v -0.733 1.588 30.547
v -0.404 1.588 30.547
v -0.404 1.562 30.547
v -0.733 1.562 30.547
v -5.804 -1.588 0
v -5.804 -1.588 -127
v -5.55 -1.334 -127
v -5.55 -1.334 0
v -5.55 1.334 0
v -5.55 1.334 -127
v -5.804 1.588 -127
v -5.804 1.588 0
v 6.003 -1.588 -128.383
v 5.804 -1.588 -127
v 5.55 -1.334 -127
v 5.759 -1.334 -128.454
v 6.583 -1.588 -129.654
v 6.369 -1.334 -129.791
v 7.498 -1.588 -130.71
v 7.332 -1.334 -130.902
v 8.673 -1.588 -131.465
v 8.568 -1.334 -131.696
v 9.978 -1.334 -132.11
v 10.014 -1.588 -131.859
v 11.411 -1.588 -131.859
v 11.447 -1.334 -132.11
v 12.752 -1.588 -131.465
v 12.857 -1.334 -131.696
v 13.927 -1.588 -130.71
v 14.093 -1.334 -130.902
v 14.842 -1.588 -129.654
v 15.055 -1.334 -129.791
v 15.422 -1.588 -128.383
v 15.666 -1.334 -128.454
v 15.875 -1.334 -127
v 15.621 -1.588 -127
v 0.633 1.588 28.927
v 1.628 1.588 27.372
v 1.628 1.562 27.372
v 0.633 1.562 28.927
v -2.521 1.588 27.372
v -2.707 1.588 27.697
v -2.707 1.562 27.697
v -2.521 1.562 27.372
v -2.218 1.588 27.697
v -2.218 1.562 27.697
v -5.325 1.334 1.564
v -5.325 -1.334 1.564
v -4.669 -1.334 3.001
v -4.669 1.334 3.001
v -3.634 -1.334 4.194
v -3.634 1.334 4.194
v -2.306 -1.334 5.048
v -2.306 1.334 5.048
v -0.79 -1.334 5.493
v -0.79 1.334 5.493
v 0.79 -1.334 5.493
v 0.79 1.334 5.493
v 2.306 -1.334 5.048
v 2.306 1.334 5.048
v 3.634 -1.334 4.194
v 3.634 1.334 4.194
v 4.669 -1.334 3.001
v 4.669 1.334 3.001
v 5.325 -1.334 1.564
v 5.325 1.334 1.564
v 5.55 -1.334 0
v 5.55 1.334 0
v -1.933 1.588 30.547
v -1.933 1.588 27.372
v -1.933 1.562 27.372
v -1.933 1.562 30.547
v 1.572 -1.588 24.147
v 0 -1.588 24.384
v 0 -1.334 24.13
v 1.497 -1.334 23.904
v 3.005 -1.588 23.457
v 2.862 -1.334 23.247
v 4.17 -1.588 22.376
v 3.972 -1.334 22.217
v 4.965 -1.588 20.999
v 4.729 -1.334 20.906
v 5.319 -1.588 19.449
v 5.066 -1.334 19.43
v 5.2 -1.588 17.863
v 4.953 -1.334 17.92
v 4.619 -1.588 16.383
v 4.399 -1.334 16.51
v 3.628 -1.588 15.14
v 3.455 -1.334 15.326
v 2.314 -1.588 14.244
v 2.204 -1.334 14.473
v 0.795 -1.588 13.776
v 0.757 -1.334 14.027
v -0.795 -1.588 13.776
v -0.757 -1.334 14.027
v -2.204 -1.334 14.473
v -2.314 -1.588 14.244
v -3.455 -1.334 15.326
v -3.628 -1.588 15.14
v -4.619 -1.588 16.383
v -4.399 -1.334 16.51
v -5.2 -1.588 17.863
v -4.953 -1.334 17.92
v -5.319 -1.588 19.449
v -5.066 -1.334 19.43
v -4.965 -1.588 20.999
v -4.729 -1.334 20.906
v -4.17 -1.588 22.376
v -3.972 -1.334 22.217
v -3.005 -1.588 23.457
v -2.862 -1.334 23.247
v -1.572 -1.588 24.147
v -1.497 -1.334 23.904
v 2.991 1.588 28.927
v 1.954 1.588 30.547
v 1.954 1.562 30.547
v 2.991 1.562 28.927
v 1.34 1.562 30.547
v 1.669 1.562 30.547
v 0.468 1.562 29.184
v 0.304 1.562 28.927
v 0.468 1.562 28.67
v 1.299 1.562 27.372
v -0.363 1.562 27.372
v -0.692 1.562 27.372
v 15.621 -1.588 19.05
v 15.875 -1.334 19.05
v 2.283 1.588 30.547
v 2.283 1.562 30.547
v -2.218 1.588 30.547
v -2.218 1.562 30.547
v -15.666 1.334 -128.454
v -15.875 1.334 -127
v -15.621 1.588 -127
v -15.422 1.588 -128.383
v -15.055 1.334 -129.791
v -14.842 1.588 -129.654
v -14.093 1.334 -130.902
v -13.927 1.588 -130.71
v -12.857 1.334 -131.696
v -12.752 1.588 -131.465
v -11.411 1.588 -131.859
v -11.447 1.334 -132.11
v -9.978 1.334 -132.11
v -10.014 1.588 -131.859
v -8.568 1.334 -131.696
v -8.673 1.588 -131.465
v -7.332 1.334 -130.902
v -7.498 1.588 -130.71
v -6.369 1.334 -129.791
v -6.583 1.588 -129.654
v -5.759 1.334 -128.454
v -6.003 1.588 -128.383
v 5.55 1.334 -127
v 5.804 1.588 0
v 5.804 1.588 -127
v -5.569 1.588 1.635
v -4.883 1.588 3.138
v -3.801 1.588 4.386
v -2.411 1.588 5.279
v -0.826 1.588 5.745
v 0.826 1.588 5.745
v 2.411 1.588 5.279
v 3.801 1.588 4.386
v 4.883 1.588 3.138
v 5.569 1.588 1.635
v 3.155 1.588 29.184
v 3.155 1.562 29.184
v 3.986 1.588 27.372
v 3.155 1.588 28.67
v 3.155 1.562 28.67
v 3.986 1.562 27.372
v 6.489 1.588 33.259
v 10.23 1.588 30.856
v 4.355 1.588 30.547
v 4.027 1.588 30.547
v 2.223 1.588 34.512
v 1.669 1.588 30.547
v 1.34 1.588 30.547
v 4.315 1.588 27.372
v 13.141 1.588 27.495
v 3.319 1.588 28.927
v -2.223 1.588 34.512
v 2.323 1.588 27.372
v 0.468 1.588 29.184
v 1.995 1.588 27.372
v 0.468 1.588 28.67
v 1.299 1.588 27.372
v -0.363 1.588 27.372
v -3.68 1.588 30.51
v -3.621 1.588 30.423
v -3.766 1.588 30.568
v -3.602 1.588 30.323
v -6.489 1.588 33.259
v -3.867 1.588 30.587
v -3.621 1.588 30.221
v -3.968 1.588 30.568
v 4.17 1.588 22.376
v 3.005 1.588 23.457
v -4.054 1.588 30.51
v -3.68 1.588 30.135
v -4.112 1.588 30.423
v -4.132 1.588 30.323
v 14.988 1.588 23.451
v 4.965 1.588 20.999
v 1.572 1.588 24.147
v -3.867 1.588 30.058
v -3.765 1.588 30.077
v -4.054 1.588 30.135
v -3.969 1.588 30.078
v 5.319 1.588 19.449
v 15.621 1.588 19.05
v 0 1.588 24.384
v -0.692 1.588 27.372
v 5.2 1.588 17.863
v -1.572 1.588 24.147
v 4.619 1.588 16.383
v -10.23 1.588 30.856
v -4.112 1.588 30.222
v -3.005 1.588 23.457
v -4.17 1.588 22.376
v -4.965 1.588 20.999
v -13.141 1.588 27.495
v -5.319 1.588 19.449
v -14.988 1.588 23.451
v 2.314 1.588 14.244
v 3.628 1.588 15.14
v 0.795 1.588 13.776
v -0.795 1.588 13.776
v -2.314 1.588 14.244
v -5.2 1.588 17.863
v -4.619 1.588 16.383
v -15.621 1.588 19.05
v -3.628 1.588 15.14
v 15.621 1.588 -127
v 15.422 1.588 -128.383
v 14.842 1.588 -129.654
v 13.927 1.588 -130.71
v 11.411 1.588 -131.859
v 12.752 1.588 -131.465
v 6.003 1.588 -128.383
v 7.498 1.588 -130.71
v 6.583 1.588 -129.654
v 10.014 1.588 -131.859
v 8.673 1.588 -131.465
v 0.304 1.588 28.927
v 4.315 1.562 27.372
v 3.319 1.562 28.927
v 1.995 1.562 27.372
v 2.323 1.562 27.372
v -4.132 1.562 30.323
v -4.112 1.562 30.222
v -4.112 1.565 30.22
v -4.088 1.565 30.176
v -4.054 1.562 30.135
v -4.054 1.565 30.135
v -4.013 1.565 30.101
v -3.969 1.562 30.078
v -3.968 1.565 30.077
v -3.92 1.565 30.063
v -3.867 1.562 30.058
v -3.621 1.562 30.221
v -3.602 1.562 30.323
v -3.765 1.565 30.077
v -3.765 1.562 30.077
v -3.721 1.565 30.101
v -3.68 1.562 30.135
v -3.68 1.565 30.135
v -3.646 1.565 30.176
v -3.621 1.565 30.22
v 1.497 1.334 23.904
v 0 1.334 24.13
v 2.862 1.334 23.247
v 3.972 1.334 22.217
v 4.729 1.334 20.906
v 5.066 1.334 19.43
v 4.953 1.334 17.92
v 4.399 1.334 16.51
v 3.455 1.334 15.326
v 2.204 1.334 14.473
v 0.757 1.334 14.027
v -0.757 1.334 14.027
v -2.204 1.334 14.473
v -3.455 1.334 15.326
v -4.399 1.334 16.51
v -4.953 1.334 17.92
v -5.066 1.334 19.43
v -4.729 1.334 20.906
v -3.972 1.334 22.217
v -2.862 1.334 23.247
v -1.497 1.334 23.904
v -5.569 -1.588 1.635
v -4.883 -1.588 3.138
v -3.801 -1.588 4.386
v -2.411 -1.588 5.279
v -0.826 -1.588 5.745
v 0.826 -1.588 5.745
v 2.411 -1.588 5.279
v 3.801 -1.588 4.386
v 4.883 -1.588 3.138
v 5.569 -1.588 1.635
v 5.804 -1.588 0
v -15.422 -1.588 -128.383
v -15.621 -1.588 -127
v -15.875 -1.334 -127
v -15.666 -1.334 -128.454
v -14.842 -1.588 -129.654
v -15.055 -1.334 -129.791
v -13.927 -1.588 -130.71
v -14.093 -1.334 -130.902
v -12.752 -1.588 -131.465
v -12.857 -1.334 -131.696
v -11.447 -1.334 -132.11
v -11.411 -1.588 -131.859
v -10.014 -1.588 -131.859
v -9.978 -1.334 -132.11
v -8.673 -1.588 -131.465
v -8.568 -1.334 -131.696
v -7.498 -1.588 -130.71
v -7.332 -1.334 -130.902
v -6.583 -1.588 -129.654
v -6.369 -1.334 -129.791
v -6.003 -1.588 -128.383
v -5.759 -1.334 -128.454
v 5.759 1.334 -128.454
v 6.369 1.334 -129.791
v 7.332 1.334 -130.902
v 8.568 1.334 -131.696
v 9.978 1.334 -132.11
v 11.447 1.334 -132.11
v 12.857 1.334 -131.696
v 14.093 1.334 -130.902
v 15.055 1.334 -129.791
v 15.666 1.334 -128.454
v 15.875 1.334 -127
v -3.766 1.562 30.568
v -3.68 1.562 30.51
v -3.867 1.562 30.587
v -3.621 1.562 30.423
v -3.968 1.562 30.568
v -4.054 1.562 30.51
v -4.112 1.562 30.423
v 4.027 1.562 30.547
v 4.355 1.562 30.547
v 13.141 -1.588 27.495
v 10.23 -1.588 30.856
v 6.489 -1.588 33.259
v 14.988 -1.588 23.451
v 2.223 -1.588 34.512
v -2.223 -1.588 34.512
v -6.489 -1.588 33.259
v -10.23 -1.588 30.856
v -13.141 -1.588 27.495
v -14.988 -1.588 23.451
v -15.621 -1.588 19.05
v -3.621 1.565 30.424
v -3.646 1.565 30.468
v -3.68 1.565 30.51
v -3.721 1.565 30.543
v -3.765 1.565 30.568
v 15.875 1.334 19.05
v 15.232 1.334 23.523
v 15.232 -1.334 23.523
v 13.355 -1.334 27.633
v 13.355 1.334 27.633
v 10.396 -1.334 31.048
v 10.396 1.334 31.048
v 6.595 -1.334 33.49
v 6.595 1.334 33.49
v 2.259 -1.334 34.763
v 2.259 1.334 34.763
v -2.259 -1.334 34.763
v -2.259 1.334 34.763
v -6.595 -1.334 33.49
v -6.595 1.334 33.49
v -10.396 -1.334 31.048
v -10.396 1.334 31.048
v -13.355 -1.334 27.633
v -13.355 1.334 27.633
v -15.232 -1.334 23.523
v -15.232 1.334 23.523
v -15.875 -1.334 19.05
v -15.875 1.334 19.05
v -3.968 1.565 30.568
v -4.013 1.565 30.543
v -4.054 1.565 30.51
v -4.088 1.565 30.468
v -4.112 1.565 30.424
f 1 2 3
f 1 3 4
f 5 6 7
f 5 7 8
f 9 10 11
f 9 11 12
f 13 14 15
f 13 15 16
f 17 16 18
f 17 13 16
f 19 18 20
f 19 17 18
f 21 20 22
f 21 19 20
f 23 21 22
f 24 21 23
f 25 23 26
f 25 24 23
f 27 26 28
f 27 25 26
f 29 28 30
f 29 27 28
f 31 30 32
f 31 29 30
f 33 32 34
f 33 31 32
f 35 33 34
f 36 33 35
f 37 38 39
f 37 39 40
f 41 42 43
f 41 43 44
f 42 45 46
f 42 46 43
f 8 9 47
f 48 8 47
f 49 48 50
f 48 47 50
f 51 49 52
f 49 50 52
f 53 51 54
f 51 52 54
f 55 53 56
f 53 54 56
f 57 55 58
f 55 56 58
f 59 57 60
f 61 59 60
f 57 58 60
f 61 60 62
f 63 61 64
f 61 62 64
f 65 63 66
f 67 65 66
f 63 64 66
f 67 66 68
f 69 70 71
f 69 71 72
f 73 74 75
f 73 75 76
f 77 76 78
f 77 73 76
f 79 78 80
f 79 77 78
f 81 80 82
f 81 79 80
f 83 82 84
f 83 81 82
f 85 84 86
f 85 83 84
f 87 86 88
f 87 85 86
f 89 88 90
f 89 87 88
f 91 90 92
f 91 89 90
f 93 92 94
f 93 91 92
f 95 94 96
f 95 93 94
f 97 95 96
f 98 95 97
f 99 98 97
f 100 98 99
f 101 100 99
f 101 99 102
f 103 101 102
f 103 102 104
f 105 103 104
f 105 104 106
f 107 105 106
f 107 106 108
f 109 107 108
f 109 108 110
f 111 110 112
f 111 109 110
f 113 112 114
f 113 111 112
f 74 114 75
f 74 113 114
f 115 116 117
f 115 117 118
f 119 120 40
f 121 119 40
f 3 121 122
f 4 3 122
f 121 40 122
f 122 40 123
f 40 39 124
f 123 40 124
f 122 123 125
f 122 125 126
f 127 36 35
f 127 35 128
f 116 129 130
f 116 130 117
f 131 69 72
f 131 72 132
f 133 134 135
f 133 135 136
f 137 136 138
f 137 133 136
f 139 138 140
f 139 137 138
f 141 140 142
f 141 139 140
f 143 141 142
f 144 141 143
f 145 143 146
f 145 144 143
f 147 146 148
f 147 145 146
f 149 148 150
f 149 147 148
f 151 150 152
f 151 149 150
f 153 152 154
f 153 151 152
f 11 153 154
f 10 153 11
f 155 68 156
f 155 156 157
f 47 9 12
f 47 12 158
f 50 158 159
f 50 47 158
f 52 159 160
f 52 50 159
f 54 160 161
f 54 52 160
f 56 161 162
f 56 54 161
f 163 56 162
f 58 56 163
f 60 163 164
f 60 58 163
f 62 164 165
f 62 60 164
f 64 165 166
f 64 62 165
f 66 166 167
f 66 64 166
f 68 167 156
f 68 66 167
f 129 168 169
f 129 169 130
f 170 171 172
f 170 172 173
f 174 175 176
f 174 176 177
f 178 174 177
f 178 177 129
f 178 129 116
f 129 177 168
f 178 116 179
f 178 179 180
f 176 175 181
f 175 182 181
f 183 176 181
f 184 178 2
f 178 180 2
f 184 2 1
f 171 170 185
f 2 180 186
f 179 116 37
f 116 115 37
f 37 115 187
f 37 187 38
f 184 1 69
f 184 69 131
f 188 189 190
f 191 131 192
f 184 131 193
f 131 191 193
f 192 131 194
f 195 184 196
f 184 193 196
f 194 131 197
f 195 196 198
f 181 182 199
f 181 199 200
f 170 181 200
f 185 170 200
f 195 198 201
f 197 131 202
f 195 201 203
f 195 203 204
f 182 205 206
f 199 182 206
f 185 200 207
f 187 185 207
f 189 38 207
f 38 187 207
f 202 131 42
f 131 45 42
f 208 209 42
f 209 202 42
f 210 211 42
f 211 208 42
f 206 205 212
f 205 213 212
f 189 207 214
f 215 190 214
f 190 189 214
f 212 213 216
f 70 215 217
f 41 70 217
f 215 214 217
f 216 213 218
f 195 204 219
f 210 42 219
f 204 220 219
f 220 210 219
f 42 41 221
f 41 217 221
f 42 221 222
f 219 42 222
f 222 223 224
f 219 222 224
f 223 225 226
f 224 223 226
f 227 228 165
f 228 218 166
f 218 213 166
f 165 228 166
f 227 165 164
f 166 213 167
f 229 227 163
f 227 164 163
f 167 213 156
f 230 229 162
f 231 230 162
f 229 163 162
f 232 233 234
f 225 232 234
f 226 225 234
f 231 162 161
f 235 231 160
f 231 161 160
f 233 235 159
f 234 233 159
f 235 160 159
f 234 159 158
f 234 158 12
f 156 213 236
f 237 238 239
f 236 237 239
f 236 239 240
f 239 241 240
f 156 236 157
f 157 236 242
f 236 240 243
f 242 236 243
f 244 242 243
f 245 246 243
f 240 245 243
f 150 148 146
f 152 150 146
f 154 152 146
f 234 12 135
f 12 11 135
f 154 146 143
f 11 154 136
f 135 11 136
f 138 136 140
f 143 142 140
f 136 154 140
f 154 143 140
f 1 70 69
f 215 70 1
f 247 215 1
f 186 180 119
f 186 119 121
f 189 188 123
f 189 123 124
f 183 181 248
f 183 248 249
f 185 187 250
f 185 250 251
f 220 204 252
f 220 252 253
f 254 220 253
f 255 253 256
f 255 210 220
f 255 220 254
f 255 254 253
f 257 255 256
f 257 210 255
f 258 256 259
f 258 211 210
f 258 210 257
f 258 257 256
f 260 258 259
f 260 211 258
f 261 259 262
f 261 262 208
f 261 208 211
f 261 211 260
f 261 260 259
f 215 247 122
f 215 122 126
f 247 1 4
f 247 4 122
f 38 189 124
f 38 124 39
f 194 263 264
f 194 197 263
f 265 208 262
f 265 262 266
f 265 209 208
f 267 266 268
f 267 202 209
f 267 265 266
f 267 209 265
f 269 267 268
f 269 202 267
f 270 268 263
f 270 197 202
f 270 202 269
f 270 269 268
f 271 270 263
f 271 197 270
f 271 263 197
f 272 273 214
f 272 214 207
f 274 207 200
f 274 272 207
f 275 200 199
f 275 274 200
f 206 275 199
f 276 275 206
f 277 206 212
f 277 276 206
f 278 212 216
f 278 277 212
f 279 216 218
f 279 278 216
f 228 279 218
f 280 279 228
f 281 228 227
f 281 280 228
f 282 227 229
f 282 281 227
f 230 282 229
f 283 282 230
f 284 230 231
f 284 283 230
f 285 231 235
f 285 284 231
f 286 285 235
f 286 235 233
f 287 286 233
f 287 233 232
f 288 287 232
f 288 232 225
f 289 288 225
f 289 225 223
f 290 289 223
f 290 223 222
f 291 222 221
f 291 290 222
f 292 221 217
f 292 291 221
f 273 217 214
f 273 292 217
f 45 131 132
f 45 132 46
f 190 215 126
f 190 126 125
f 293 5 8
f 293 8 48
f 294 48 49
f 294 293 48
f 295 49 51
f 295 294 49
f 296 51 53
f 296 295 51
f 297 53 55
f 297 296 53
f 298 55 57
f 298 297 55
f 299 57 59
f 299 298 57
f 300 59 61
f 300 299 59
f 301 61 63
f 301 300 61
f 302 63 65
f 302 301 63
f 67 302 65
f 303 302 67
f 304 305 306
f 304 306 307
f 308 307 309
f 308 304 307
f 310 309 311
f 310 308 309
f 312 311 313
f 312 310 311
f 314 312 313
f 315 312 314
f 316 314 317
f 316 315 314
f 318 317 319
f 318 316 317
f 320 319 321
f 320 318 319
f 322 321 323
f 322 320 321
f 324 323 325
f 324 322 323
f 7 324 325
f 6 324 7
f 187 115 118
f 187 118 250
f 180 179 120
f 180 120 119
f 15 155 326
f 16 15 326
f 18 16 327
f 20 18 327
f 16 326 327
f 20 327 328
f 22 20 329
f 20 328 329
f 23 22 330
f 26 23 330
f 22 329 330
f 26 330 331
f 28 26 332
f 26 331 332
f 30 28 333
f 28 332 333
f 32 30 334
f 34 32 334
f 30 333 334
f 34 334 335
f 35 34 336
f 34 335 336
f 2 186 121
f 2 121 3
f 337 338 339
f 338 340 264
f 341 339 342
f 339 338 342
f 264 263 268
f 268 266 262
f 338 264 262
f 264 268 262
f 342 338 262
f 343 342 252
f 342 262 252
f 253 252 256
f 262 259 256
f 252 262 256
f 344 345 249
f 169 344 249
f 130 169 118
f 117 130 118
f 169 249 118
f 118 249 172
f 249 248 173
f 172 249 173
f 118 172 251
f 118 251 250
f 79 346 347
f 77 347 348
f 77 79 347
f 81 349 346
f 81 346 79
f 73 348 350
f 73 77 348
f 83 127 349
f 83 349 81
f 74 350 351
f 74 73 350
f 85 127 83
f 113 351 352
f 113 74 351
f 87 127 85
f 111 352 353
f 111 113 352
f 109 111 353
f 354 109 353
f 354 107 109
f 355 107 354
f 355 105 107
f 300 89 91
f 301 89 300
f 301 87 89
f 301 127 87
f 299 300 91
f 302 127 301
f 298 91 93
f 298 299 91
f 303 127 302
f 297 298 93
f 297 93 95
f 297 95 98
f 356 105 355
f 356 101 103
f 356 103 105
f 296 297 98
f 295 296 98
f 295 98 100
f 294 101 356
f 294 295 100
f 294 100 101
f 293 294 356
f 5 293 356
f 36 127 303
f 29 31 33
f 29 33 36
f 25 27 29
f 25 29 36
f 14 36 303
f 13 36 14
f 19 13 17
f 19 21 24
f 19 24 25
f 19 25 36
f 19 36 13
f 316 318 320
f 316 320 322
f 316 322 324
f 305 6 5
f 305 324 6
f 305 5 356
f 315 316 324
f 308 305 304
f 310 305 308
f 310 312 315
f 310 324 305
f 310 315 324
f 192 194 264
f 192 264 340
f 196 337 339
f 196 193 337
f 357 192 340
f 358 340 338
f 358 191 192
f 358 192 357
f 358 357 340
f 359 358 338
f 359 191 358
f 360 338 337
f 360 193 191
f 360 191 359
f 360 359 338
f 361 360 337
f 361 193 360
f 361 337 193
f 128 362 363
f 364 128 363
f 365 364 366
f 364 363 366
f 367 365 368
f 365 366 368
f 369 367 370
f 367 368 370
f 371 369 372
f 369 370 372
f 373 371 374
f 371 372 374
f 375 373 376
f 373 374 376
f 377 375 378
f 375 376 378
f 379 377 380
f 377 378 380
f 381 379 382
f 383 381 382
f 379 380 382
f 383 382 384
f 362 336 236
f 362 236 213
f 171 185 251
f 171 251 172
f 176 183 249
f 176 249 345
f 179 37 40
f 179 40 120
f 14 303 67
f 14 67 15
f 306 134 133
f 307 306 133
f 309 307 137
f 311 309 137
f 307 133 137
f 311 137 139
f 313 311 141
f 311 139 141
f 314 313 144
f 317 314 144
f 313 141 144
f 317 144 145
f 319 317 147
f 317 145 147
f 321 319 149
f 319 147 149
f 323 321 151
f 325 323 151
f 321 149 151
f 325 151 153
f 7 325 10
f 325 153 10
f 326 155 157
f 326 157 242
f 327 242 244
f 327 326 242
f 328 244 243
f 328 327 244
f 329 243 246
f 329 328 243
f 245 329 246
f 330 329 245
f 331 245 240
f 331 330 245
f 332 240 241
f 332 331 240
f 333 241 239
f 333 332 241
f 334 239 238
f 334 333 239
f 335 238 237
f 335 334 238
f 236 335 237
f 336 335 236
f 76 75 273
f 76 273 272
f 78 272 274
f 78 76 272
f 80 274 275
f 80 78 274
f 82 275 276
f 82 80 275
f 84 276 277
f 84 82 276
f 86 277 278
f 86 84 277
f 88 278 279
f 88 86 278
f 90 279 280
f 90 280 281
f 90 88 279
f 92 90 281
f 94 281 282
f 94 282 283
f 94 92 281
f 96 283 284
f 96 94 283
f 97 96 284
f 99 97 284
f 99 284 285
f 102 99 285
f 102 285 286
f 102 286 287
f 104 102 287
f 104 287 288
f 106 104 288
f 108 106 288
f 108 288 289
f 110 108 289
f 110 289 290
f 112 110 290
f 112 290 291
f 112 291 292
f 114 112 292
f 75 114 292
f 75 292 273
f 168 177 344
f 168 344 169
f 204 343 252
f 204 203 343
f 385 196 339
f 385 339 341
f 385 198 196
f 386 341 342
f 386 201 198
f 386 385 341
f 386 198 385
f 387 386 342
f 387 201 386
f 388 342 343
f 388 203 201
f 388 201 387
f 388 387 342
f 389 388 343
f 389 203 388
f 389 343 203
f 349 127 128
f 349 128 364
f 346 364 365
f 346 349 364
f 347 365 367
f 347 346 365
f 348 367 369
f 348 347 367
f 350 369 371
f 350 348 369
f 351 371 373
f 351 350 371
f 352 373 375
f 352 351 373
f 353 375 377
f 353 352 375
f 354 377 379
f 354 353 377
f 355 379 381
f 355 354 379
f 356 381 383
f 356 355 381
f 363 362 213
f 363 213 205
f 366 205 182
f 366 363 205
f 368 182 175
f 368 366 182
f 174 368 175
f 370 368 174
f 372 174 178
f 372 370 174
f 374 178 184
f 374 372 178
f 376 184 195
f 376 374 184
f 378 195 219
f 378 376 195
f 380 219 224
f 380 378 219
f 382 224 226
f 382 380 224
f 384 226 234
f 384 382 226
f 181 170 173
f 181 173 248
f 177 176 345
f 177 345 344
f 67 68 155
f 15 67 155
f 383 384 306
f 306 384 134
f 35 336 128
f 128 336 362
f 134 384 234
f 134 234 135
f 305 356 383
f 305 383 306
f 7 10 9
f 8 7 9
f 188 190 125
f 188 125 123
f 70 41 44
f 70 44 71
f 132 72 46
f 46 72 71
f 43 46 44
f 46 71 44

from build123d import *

# Parameters (mm, degrees)
SKETCH1_R          = 5.08
BASE_EXTRUDE_DEPTH = 1.5875
CHAMFER1_SIZE      = 0.254
EXTRUDE1_DEPTH     = 0.0254


with BuildPart() as part:
    # Sketch1 → Base-Extrude (new body, symmetric)
    with BuildSketch(Plane(origin=(0, 0, 0), x_dir=(1, 0, 0), z_dir=(0, 1, 0))):
        with BuildLine():
            Line((5.5499, 0), (5.5499, 127))
            ThreePointArc((5.5499, 127), (10.71245, 132.16255), (15.875, 127))
            Line((15.875, 127), (15.875, -19.05))
            ThreePointArc((15.875, -19.05), (0, -34.925), (-15.875, -19.05))
            Line((-15.875, -19.05), (-15.875, 127))
            ThreePointArc((-15.875, 127), (-10.71245, 132.16255), (-5.5499, 127))
            Line((-5.5499, 127), (-5.5499, 0))
            ThreePointArc((-5.5499, 0), (0, -5.5499), (5.5499, 0))
        make_face()
        with Locations(Location((0, -19.05, 0), (0, 0, 270))):  # turned: the seam where the file's is
            Circle(SKETCH1_R, mode=Mode.SUBTRACT)
    extrude(amount=BASE_EXTRUDE_DEPTH, both=True)

    # Chamfer1
    chamfer1_edges = [part.edges().sort_by_distance(p)[0] for p in [
        (-10.71245, 1.5875, -132.16255),
        (-5.5499, -1.5875, -63.5),
        (0, -1.5875, 5.5499),
        (-15.875, 1.5875, -53.975),
        (0, 1.5875, 34.925),
        (15.875, 1.5875, -53.975),
        (0, -1.5875, 13.97),
        (0, 1.5875, 13.97),
        (10.71245, 1.5875, -132.16255),
        (5.5499, 1.5875, -63.5),
        (0, 1.5875, 5.5499),
        (-5.5499, 1.5875, -63.5),
        (5.5499, -1.5875, -63.5),
        (10.71245, -1.5875, -132.16255),
        (15.875, -1.5875, -53.975),
        (0, -1.5875, 34.925),
        (-15.875, -1.5875, -53.975),
        (-10.71245, -1.5875, -132.16255),
    ]]
    chamfer(chamfer1_edges, length=CHAMFER1_SIZE)

    # Sketch2 → Extrude1 (cut)
    with BuildSketch(Plane(origin=(0, 1.5875, 0), x_dir=(1, 0, 0), z_dir=(0, 1, 0))):
        with BuildLine():
            add(Edge.make_bspline(
                [(-3.866987179, -30.058088124), (-3.849306773, -30.059138746), (-3.814646402, -30.061198369), (-3.764536622, -30.075328638), (-3.719184323, -30.100418994), (-3.678787215, -30.1338588), (-3.645489197, -30.174404152), (-3.619504678, -30.219394726), (-3.605497498, -30.269924028), (-3.603452878, -30.304785233), (-3.602403846, -30.322671457)],
                knots=[0, 0, 0, 0, 1.020151414, 1.999887582, 2.974338812, 3.990962822, 5.007586832, 5.987933904, 6.967670073, 8, 8, 8, 8], degree=3))
            add(Edge.make_bspline(
                [(-3.602403846, -30.322671457), (-3.603488427, -30.340127906), (-3.605627204, -30.374551768), (-3.61947257, -30.424699952), (-3.64568723, -30.469718643), (-3.678557545, -30.510814154), (-3.71919431, -30.544324801), (-3.764643842, -30.569201693), (-3.814528769, -30.584343703), (-3.849287148, -30.586272558), (-3.866987179, -30.58725479)],
                knots=[0, 0, 0, 0, 1.009421747, 1.99056486, 2.972319754, 3.999869655, 5.017953583, 5.993804169, 6.978383603, 8, 8, 8, 8], degree=3))
            add(Edge.make_bspline(
                [(-3.866987179, -30.58725479), (-3.884699965, -30.586308099), (-3.919279963, -30.584459908), (-3.968978686, -30.568890791), (-4.014705008, -30.544558081), (-4.055333861, -30.51075167), (-4.088479474, -30.469930112), (-4.113539643, -30.424389911), (-4.128589278, -30.374695321), (-4.130568548, -30.340156181), (-4.131570513, -30.322671457)],
                knots=[0, 0, 0, 0, 1.022052826, 1.995314843, 2.982371812, 4.00089066, 5.028879526, 6.005146991, 6.990147033, 8, 8, 8, 8], degree=3))
            add(Edge.make_bspline(
                [(-4.131570513, -30.322671457), (-4.130607037, -30.304755948), (-4.128725969, -30.269778116), (-4.113508049, -30.21970464), (-4.088673913, -30.174194699), (-4.055104734, -30.133920658), (-4.014714837, -30.100186463), (-3.969088993, -30.075634829), (-3.919160268, -30.061083883), (-3.884679823, -30.059104029), (-3.866987179, -30.058088124)],
                knots=[0, 0, 0, 0, 1.032775665, 2.016367738, 2.991239715, 4.008302682, 5.025365648, 6.011011707, 6.979408107, 8, 8, 8, 8], degree=3))
        make_face()
        Polygon((-2.520537861, -27.371549662), (-1.93349359, -27.371549662), (-1.93349359, -30.546549662), (-2.218429487, -30.546549662), (-2.218429487, -27.697190688), (-2.706891026, -27.697190688), align=None)
        Polygon((-0.691987179, -27.371549662), (-0.363166066, -27.371549662), (0.468108974, -28.670297659), (1.299384014, -27.371549662), (1.628205128, -27.371549662), (0.63283754, -28.927248781), (1.668910256, -30.546549662), (1.340089143, -30.546549662), (0.468108974, -29.184199903), (-0.403871194, -30.546549662), (-0.732692308, -30.546549662), (0.304016426, -28.927248781), align=None)
        Polygon((1.994551282, -27.371549662), (2.323372396, -27.371549662), (3.154647436, -28.670297659), (3.985922476, -27.371549662), (4.31474359, -27.371549662), (3.319376002, -28.927248781), (4.355448718, -30.546549662), (4.026627604, -30.546549662), (3.154647436, -29.184199903), (2.282667268, -30.546549662), (1.953846154, -30.546549662), (2.990554888, -28.927248781), align=None)
    extrude(amount=-EXTRUDE1_DEPTH, mode=Mode.SUBTRACT)


solid = part.part
